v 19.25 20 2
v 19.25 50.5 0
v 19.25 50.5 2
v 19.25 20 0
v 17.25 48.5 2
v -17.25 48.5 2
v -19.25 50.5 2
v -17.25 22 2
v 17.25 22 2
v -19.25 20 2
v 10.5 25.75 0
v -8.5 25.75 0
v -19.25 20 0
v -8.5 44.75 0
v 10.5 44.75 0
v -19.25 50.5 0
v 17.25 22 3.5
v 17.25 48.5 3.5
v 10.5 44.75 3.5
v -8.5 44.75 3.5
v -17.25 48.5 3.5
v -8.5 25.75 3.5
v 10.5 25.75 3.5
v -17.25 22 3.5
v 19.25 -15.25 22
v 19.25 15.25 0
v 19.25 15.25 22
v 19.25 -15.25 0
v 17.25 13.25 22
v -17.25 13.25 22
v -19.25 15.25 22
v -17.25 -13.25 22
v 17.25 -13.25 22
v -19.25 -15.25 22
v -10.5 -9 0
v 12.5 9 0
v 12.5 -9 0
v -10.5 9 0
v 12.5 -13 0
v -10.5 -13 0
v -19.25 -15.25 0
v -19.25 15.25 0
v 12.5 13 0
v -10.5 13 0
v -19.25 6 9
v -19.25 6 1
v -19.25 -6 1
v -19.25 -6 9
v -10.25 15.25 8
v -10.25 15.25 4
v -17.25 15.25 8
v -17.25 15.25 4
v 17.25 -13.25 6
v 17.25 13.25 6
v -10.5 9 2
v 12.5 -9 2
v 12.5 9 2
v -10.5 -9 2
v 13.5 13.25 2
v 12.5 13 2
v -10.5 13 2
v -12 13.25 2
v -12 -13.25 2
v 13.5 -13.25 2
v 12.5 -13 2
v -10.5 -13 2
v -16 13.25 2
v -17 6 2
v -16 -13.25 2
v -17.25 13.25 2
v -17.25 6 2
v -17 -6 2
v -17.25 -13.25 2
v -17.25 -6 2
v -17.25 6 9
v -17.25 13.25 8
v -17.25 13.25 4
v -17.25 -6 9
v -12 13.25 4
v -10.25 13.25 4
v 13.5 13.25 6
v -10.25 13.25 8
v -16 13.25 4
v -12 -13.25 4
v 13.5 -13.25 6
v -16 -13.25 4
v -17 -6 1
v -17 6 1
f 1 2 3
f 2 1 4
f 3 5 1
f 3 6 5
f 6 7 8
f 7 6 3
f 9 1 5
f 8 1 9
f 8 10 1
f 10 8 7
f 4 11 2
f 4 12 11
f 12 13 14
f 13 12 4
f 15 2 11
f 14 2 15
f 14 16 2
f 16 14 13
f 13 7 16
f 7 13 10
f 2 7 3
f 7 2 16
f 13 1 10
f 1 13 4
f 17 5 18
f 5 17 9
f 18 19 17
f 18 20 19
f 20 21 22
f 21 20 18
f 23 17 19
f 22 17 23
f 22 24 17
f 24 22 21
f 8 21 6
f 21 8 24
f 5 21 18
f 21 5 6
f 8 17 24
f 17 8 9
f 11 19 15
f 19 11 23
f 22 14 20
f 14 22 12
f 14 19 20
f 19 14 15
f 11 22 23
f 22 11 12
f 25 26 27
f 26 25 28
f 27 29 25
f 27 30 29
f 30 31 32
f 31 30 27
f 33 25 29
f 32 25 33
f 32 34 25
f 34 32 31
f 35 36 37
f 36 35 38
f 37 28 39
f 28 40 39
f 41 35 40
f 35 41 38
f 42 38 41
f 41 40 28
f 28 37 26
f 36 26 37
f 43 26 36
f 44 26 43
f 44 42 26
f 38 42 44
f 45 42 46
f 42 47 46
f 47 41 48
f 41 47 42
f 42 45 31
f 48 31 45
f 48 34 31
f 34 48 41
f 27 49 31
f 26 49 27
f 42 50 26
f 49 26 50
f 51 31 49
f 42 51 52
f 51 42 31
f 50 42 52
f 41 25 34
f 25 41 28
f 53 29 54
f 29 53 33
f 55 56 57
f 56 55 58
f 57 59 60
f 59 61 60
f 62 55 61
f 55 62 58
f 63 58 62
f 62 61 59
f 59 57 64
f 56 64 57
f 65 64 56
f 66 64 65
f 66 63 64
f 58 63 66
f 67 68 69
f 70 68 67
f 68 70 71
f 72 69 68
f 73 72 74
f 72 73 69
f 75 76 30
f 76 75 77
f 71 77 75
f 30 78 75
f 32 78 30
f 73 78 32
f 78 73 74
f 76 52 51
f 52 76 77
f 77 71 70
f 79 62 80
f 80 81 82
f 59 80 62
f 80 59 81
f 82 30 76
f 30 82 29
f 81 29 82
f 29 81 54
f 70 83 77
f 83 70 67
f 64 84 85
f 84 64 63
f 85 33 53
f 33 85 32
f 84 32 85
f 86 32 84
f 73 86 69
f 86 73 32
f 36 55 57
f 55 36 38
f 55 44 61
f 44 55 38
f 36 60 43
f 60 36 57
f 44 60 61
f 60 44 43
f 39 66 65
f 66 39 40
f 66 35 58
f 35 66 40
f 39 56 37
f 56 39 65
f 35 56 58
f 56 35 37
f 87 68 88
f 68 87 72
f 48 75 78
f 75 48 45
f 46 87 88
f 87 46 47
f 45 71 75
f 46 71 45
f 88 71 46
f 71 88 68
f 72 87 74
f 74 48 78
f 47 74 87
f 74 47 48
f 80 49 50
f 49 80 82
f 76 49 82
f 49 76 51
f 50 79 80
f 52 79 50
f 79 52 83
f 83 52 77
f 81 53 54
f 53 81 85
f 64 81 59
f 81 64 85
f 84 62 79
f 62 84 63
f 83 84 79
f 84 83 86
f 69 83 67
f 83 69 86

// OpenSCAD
height = 22.0;

thickness = 2;
fudge = 0.1;

width = 38.5;
depth = 30.50;
 
cavity_width = width - (2 * thickness);
cavity_depth = depth - (2 * thickness);
cavity_height = height - thickness + fudge;

hole_diameter = 0;

slit_width = 4.0;
slit_height = 23.0;

// lid
difference() {
    union () {
        translate([-(width / 2.0), 20, 0.0]) cube([width, depth, 2.0]);
        translate([-(cavity_width / 2.0), 22, 2.0]) cube([cavity_width, cavity_depth, 1.5]);            
    }
    translate([1, 22 + (cavity_depth / 2), 2.5]) cube(19,8, center = true);
    //rotate([0, 0, 90]) translate([21.9, -12.5, 0]) cube([slit_width, slit_height, 10]);
   // rotate([0, 0, 90]) translate([44.6, -12.5, 0]) cube([slit_width, slit_height, 10]);
}

// base
union() {
    translate([13.5, -(cavity_depth / 2.0), 2]) cube([4.0, cavity_depth, 4.0]);
    translate([-16, -(cavity_depth / 2.0), 2]) cube([4.0, cavity_depth, 2.0]);
    difference () {
        translate([0, 0, height / 2.0]) cube([width, depth, height], center = true); 
        translate([0, 0, (cavity_height / 2.0) + thickness]) cube([cavity_width, cavity_depth, cavity_height], center = true);
        translate([1, 0, thickness / 2.0]) cylinder(h = thickness + fudge, r1 = hole_diameter, r2 = hole_diameter, center = true);
        rotate([0, 0, 90]) translate([9, -12.5, 0]) cube([slit_width, slit_height, 5]);
        rotate([0, 0, 90]) translate([-13, -12.5, 0]) cube([slit_width, slit_height, 5]);
        translate([-20, -6, 1]) cube([3, 12, 8]);
        translate([-17.25, 13.0, 4]) cube([7, 3, 4]);        
    }
}
